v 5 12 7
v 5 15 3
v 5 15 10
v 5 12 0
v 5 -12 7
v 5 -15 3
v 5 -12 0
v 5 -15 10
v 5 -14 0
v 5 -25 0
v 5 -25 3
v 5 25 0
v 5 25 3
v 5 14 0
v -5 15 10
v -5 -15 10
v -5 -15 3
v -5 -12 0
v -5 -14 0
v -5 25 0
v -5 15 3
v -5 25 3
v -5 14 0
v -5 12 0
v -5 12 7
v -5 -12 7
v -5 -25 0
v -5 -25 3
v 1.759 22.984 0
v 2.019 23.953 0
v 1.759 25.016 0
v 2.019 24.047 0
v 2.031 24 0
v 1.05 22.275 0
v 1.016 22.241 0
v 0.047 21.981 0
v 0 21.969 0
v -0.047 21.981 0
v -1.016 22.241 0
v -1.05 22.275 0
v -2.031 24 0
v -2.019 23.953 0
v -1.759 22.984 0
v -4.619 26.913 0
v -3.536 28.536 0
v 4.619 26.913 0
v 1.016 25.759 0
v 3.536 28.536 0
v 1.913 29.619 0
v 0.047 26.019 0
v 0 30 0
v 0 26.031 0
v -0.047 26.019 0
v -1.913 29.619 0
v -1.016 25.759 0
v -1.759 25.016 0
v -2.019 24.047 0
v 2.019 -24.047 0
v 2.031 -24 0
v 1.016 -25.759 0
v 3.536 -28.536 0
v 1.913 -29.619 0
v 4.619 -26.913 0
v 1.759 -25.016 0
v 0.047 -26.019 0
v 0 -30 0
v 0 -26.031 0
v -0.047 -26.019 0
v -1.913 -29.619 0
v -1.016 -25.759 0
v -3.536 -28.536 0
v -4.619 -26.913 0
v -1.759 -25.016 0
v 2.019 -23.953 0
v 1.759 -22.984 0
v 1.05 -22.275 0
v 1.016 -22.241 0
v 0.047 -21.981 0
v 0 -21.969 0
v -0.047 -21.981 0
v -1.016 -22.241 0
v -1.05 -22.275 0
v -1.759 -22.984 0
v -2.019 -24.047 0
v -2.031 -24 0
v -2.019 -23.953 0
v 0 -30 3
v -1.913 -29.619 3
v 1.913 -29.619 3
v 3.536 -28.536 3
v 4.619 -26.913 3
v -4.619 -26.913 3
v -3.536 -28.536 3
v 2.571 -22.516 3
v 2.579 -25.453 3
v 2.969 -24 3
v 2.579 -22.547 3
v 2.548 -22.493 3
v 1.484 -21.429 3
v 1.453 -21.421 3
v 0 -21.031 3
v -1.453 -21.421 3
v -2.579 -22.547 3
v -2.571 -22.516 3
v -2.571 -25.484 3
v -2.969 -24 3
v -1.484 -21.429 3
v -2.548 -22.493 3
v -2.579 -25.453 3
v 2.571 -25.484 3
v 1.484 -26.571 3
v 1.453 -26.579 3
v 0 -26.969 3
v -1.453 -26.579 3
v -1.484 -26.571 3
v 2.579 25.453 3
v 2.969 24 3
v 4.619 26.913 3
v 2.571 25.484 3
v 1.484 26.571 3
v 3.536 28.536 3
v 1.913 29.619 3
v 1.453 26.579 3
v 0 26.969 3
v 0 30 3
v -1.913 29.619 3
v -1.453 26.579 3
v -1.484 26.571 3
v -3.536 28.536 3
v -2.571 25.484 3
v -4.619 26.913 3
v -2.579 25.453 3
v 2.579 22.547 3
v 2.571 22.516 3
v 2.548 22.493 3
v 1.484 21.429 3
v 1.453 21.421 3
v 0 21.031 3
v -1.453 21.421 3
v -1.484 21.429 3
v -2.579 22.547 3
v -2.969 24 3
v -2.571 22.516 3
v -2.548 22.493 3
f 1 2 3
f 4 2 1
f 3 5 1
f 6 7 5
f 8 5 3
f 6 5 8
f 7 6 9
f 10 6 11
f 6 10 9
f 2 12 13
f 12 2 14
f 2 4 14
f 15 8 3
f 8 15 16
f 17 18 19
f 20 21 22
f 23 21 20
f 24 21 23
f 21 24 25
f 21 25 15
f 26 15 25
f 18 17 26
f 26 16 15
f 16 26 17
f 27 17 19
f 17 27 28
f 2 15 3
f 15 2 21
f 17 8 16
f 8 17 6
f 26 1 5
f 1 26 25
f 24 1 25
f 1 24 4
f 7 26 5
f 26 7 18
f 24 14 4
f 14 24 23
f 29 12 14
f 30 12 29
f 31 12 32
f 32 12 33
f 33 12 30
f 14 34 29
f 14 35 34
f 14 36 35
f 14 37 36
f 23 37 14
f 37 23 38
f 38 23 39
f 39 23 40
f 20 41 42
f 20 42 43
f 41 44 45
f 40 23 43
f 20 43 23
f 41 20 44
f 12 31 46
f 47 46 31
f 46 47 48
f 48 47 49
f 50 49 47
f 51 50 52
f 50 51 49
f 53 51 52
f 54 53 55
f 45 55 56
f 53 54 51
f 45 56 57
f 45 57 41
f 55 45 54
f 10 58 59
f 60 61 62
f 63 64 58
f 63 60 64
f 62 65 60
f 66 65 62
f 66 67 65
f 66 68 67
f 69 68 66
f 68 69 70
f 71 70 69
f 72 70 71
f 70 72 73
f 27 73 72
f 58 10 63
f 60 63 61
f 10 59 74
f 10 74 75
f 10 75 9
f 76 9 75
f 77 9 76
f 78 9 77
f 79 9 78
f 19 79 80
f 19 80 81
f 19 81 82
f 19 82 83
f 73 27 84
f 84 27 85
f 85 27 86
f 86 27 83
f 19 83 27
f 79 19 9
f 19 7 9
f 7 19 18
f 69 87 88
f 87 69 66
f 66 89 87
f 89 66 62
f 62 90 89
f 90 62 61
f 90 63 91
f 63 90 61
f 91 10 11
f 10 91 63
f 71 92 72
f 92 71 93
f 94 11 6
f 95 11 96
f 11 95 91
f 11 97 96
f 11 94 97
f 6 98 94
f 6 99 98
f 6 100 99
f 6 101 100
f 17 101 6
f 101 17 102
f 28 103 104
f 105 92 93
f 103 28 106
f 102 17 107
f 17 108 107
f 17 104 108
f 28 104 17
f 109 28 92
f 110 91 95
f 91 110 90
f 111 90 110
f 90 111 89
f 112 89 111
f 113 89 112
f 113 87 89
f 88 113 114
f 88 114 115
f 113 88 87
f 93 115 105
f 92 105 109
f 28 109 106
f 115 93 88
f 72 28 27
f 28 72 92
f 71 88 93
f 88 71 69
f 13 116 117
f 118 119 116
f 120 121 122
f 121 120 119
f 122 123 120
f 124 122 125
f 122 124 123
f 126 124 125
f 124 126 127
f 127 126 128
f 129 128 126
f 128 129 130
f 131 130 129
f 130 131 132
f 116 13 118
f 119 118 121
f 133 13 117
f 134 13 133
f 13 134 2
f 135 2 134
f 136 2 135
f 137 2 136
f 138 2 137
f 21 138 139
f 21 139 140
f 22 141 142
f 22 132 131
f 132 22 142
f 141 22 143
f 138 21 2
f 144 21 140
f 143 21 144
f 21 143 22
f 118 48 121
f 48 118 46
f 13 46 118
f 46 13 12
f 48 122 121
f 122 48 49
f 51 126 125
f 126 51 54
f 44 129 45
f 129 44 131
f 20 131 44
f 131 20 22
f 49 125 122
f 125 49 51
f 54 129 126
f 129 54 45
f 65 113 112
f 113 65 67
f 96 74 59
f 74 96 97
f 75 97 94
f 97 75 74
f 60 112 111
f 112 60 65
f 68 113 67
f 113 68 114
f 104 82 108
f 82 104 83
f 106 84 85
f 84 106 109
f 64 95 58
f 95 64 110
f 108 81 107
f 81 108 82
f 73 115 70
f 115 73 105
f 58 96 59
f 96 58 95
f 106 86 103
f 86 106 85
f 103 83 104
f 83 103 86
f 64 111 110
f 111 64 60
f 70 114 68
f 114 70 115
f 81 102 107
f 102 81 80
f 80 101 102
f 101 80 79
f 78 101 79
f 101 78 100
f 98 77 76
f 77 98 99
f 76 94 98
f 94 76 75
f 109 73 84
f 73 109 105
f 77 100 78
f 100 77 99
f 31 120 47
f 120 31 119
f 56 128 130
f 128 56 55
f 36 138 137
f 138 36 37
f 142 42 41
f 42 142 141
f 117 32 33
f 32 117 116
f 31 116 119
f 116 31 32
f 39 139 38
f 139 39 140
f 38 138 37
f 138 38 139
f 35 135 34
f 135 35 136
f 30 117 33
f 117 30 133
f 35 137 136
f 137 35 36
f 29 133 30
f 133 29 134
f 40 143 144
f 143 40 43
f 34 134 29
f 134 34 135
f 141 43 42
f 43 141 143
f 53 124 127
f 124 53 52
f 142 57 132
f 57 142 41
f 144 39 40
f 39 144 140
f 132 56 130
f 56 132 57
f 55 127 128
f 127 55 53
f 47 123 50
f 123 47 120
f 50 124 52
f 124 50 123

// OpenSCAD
/* Block Strap  - Loic Septemeber 2017 */

// ToDo: Clean up, variable and module better naming

height = 3;
depth = 10;

holder_length = 30;
holder_height = 10;
bracket_length = 10;

with_screw_holes = true;

screw_hole_top_depth = 6;
screw_hole_bottom_depth = 4;

//////////
difference()
{
cable_strap_base();

if(with_screw_holes)
    {
    translate([0,-bracket_length-holder_length/2 +1,-0.1])
      color("red")
      cylinder(height+0.2,screw_hole_bottom_depth/2,screw_hole_top_depth/2,$fn=12);
    
    translate([0,bracket_length + holder_length/2 - 1,-0.1])
      color("red")
      cylinder(height+0.2,screw_hole_bottom_depth/2,screw_hole_top_depth/2,$fn=12);
    }
}


/////////////
// Helper Modules
module cable_strap_base()
{   
    radius = depth / 2;
    offset = bracket_length + holder_length/2;
    translate([0,-offset,0])
    {
        cylinder(height,radius,radius);
        translate([-depth/2,0,0])
            cube([depth,bracket_length+1,height]);
        
        translate([0,bracket_length+(holder_length/2)])
        {
            holder(holder_length,holder_height,depth,height);   
        }
        
        translate([-depth/2,bracket_length+holder_length-1,0])
            cube([depth,bracket_length+1,height]);
        
        translate([0,2*bracket_length+holder_length,0])
            cylinder(height,radius,radius);
    }
}

module holder(length,height,depth,width)
{
    difference()
    {
        cube([depth,length,height*2],true);
        cube([depth+2,length-width*2,height*2-width*2],true);
        translate([0,0,-height])
            cube([depth+2,length+2,height*2],true);
    }
    
}
